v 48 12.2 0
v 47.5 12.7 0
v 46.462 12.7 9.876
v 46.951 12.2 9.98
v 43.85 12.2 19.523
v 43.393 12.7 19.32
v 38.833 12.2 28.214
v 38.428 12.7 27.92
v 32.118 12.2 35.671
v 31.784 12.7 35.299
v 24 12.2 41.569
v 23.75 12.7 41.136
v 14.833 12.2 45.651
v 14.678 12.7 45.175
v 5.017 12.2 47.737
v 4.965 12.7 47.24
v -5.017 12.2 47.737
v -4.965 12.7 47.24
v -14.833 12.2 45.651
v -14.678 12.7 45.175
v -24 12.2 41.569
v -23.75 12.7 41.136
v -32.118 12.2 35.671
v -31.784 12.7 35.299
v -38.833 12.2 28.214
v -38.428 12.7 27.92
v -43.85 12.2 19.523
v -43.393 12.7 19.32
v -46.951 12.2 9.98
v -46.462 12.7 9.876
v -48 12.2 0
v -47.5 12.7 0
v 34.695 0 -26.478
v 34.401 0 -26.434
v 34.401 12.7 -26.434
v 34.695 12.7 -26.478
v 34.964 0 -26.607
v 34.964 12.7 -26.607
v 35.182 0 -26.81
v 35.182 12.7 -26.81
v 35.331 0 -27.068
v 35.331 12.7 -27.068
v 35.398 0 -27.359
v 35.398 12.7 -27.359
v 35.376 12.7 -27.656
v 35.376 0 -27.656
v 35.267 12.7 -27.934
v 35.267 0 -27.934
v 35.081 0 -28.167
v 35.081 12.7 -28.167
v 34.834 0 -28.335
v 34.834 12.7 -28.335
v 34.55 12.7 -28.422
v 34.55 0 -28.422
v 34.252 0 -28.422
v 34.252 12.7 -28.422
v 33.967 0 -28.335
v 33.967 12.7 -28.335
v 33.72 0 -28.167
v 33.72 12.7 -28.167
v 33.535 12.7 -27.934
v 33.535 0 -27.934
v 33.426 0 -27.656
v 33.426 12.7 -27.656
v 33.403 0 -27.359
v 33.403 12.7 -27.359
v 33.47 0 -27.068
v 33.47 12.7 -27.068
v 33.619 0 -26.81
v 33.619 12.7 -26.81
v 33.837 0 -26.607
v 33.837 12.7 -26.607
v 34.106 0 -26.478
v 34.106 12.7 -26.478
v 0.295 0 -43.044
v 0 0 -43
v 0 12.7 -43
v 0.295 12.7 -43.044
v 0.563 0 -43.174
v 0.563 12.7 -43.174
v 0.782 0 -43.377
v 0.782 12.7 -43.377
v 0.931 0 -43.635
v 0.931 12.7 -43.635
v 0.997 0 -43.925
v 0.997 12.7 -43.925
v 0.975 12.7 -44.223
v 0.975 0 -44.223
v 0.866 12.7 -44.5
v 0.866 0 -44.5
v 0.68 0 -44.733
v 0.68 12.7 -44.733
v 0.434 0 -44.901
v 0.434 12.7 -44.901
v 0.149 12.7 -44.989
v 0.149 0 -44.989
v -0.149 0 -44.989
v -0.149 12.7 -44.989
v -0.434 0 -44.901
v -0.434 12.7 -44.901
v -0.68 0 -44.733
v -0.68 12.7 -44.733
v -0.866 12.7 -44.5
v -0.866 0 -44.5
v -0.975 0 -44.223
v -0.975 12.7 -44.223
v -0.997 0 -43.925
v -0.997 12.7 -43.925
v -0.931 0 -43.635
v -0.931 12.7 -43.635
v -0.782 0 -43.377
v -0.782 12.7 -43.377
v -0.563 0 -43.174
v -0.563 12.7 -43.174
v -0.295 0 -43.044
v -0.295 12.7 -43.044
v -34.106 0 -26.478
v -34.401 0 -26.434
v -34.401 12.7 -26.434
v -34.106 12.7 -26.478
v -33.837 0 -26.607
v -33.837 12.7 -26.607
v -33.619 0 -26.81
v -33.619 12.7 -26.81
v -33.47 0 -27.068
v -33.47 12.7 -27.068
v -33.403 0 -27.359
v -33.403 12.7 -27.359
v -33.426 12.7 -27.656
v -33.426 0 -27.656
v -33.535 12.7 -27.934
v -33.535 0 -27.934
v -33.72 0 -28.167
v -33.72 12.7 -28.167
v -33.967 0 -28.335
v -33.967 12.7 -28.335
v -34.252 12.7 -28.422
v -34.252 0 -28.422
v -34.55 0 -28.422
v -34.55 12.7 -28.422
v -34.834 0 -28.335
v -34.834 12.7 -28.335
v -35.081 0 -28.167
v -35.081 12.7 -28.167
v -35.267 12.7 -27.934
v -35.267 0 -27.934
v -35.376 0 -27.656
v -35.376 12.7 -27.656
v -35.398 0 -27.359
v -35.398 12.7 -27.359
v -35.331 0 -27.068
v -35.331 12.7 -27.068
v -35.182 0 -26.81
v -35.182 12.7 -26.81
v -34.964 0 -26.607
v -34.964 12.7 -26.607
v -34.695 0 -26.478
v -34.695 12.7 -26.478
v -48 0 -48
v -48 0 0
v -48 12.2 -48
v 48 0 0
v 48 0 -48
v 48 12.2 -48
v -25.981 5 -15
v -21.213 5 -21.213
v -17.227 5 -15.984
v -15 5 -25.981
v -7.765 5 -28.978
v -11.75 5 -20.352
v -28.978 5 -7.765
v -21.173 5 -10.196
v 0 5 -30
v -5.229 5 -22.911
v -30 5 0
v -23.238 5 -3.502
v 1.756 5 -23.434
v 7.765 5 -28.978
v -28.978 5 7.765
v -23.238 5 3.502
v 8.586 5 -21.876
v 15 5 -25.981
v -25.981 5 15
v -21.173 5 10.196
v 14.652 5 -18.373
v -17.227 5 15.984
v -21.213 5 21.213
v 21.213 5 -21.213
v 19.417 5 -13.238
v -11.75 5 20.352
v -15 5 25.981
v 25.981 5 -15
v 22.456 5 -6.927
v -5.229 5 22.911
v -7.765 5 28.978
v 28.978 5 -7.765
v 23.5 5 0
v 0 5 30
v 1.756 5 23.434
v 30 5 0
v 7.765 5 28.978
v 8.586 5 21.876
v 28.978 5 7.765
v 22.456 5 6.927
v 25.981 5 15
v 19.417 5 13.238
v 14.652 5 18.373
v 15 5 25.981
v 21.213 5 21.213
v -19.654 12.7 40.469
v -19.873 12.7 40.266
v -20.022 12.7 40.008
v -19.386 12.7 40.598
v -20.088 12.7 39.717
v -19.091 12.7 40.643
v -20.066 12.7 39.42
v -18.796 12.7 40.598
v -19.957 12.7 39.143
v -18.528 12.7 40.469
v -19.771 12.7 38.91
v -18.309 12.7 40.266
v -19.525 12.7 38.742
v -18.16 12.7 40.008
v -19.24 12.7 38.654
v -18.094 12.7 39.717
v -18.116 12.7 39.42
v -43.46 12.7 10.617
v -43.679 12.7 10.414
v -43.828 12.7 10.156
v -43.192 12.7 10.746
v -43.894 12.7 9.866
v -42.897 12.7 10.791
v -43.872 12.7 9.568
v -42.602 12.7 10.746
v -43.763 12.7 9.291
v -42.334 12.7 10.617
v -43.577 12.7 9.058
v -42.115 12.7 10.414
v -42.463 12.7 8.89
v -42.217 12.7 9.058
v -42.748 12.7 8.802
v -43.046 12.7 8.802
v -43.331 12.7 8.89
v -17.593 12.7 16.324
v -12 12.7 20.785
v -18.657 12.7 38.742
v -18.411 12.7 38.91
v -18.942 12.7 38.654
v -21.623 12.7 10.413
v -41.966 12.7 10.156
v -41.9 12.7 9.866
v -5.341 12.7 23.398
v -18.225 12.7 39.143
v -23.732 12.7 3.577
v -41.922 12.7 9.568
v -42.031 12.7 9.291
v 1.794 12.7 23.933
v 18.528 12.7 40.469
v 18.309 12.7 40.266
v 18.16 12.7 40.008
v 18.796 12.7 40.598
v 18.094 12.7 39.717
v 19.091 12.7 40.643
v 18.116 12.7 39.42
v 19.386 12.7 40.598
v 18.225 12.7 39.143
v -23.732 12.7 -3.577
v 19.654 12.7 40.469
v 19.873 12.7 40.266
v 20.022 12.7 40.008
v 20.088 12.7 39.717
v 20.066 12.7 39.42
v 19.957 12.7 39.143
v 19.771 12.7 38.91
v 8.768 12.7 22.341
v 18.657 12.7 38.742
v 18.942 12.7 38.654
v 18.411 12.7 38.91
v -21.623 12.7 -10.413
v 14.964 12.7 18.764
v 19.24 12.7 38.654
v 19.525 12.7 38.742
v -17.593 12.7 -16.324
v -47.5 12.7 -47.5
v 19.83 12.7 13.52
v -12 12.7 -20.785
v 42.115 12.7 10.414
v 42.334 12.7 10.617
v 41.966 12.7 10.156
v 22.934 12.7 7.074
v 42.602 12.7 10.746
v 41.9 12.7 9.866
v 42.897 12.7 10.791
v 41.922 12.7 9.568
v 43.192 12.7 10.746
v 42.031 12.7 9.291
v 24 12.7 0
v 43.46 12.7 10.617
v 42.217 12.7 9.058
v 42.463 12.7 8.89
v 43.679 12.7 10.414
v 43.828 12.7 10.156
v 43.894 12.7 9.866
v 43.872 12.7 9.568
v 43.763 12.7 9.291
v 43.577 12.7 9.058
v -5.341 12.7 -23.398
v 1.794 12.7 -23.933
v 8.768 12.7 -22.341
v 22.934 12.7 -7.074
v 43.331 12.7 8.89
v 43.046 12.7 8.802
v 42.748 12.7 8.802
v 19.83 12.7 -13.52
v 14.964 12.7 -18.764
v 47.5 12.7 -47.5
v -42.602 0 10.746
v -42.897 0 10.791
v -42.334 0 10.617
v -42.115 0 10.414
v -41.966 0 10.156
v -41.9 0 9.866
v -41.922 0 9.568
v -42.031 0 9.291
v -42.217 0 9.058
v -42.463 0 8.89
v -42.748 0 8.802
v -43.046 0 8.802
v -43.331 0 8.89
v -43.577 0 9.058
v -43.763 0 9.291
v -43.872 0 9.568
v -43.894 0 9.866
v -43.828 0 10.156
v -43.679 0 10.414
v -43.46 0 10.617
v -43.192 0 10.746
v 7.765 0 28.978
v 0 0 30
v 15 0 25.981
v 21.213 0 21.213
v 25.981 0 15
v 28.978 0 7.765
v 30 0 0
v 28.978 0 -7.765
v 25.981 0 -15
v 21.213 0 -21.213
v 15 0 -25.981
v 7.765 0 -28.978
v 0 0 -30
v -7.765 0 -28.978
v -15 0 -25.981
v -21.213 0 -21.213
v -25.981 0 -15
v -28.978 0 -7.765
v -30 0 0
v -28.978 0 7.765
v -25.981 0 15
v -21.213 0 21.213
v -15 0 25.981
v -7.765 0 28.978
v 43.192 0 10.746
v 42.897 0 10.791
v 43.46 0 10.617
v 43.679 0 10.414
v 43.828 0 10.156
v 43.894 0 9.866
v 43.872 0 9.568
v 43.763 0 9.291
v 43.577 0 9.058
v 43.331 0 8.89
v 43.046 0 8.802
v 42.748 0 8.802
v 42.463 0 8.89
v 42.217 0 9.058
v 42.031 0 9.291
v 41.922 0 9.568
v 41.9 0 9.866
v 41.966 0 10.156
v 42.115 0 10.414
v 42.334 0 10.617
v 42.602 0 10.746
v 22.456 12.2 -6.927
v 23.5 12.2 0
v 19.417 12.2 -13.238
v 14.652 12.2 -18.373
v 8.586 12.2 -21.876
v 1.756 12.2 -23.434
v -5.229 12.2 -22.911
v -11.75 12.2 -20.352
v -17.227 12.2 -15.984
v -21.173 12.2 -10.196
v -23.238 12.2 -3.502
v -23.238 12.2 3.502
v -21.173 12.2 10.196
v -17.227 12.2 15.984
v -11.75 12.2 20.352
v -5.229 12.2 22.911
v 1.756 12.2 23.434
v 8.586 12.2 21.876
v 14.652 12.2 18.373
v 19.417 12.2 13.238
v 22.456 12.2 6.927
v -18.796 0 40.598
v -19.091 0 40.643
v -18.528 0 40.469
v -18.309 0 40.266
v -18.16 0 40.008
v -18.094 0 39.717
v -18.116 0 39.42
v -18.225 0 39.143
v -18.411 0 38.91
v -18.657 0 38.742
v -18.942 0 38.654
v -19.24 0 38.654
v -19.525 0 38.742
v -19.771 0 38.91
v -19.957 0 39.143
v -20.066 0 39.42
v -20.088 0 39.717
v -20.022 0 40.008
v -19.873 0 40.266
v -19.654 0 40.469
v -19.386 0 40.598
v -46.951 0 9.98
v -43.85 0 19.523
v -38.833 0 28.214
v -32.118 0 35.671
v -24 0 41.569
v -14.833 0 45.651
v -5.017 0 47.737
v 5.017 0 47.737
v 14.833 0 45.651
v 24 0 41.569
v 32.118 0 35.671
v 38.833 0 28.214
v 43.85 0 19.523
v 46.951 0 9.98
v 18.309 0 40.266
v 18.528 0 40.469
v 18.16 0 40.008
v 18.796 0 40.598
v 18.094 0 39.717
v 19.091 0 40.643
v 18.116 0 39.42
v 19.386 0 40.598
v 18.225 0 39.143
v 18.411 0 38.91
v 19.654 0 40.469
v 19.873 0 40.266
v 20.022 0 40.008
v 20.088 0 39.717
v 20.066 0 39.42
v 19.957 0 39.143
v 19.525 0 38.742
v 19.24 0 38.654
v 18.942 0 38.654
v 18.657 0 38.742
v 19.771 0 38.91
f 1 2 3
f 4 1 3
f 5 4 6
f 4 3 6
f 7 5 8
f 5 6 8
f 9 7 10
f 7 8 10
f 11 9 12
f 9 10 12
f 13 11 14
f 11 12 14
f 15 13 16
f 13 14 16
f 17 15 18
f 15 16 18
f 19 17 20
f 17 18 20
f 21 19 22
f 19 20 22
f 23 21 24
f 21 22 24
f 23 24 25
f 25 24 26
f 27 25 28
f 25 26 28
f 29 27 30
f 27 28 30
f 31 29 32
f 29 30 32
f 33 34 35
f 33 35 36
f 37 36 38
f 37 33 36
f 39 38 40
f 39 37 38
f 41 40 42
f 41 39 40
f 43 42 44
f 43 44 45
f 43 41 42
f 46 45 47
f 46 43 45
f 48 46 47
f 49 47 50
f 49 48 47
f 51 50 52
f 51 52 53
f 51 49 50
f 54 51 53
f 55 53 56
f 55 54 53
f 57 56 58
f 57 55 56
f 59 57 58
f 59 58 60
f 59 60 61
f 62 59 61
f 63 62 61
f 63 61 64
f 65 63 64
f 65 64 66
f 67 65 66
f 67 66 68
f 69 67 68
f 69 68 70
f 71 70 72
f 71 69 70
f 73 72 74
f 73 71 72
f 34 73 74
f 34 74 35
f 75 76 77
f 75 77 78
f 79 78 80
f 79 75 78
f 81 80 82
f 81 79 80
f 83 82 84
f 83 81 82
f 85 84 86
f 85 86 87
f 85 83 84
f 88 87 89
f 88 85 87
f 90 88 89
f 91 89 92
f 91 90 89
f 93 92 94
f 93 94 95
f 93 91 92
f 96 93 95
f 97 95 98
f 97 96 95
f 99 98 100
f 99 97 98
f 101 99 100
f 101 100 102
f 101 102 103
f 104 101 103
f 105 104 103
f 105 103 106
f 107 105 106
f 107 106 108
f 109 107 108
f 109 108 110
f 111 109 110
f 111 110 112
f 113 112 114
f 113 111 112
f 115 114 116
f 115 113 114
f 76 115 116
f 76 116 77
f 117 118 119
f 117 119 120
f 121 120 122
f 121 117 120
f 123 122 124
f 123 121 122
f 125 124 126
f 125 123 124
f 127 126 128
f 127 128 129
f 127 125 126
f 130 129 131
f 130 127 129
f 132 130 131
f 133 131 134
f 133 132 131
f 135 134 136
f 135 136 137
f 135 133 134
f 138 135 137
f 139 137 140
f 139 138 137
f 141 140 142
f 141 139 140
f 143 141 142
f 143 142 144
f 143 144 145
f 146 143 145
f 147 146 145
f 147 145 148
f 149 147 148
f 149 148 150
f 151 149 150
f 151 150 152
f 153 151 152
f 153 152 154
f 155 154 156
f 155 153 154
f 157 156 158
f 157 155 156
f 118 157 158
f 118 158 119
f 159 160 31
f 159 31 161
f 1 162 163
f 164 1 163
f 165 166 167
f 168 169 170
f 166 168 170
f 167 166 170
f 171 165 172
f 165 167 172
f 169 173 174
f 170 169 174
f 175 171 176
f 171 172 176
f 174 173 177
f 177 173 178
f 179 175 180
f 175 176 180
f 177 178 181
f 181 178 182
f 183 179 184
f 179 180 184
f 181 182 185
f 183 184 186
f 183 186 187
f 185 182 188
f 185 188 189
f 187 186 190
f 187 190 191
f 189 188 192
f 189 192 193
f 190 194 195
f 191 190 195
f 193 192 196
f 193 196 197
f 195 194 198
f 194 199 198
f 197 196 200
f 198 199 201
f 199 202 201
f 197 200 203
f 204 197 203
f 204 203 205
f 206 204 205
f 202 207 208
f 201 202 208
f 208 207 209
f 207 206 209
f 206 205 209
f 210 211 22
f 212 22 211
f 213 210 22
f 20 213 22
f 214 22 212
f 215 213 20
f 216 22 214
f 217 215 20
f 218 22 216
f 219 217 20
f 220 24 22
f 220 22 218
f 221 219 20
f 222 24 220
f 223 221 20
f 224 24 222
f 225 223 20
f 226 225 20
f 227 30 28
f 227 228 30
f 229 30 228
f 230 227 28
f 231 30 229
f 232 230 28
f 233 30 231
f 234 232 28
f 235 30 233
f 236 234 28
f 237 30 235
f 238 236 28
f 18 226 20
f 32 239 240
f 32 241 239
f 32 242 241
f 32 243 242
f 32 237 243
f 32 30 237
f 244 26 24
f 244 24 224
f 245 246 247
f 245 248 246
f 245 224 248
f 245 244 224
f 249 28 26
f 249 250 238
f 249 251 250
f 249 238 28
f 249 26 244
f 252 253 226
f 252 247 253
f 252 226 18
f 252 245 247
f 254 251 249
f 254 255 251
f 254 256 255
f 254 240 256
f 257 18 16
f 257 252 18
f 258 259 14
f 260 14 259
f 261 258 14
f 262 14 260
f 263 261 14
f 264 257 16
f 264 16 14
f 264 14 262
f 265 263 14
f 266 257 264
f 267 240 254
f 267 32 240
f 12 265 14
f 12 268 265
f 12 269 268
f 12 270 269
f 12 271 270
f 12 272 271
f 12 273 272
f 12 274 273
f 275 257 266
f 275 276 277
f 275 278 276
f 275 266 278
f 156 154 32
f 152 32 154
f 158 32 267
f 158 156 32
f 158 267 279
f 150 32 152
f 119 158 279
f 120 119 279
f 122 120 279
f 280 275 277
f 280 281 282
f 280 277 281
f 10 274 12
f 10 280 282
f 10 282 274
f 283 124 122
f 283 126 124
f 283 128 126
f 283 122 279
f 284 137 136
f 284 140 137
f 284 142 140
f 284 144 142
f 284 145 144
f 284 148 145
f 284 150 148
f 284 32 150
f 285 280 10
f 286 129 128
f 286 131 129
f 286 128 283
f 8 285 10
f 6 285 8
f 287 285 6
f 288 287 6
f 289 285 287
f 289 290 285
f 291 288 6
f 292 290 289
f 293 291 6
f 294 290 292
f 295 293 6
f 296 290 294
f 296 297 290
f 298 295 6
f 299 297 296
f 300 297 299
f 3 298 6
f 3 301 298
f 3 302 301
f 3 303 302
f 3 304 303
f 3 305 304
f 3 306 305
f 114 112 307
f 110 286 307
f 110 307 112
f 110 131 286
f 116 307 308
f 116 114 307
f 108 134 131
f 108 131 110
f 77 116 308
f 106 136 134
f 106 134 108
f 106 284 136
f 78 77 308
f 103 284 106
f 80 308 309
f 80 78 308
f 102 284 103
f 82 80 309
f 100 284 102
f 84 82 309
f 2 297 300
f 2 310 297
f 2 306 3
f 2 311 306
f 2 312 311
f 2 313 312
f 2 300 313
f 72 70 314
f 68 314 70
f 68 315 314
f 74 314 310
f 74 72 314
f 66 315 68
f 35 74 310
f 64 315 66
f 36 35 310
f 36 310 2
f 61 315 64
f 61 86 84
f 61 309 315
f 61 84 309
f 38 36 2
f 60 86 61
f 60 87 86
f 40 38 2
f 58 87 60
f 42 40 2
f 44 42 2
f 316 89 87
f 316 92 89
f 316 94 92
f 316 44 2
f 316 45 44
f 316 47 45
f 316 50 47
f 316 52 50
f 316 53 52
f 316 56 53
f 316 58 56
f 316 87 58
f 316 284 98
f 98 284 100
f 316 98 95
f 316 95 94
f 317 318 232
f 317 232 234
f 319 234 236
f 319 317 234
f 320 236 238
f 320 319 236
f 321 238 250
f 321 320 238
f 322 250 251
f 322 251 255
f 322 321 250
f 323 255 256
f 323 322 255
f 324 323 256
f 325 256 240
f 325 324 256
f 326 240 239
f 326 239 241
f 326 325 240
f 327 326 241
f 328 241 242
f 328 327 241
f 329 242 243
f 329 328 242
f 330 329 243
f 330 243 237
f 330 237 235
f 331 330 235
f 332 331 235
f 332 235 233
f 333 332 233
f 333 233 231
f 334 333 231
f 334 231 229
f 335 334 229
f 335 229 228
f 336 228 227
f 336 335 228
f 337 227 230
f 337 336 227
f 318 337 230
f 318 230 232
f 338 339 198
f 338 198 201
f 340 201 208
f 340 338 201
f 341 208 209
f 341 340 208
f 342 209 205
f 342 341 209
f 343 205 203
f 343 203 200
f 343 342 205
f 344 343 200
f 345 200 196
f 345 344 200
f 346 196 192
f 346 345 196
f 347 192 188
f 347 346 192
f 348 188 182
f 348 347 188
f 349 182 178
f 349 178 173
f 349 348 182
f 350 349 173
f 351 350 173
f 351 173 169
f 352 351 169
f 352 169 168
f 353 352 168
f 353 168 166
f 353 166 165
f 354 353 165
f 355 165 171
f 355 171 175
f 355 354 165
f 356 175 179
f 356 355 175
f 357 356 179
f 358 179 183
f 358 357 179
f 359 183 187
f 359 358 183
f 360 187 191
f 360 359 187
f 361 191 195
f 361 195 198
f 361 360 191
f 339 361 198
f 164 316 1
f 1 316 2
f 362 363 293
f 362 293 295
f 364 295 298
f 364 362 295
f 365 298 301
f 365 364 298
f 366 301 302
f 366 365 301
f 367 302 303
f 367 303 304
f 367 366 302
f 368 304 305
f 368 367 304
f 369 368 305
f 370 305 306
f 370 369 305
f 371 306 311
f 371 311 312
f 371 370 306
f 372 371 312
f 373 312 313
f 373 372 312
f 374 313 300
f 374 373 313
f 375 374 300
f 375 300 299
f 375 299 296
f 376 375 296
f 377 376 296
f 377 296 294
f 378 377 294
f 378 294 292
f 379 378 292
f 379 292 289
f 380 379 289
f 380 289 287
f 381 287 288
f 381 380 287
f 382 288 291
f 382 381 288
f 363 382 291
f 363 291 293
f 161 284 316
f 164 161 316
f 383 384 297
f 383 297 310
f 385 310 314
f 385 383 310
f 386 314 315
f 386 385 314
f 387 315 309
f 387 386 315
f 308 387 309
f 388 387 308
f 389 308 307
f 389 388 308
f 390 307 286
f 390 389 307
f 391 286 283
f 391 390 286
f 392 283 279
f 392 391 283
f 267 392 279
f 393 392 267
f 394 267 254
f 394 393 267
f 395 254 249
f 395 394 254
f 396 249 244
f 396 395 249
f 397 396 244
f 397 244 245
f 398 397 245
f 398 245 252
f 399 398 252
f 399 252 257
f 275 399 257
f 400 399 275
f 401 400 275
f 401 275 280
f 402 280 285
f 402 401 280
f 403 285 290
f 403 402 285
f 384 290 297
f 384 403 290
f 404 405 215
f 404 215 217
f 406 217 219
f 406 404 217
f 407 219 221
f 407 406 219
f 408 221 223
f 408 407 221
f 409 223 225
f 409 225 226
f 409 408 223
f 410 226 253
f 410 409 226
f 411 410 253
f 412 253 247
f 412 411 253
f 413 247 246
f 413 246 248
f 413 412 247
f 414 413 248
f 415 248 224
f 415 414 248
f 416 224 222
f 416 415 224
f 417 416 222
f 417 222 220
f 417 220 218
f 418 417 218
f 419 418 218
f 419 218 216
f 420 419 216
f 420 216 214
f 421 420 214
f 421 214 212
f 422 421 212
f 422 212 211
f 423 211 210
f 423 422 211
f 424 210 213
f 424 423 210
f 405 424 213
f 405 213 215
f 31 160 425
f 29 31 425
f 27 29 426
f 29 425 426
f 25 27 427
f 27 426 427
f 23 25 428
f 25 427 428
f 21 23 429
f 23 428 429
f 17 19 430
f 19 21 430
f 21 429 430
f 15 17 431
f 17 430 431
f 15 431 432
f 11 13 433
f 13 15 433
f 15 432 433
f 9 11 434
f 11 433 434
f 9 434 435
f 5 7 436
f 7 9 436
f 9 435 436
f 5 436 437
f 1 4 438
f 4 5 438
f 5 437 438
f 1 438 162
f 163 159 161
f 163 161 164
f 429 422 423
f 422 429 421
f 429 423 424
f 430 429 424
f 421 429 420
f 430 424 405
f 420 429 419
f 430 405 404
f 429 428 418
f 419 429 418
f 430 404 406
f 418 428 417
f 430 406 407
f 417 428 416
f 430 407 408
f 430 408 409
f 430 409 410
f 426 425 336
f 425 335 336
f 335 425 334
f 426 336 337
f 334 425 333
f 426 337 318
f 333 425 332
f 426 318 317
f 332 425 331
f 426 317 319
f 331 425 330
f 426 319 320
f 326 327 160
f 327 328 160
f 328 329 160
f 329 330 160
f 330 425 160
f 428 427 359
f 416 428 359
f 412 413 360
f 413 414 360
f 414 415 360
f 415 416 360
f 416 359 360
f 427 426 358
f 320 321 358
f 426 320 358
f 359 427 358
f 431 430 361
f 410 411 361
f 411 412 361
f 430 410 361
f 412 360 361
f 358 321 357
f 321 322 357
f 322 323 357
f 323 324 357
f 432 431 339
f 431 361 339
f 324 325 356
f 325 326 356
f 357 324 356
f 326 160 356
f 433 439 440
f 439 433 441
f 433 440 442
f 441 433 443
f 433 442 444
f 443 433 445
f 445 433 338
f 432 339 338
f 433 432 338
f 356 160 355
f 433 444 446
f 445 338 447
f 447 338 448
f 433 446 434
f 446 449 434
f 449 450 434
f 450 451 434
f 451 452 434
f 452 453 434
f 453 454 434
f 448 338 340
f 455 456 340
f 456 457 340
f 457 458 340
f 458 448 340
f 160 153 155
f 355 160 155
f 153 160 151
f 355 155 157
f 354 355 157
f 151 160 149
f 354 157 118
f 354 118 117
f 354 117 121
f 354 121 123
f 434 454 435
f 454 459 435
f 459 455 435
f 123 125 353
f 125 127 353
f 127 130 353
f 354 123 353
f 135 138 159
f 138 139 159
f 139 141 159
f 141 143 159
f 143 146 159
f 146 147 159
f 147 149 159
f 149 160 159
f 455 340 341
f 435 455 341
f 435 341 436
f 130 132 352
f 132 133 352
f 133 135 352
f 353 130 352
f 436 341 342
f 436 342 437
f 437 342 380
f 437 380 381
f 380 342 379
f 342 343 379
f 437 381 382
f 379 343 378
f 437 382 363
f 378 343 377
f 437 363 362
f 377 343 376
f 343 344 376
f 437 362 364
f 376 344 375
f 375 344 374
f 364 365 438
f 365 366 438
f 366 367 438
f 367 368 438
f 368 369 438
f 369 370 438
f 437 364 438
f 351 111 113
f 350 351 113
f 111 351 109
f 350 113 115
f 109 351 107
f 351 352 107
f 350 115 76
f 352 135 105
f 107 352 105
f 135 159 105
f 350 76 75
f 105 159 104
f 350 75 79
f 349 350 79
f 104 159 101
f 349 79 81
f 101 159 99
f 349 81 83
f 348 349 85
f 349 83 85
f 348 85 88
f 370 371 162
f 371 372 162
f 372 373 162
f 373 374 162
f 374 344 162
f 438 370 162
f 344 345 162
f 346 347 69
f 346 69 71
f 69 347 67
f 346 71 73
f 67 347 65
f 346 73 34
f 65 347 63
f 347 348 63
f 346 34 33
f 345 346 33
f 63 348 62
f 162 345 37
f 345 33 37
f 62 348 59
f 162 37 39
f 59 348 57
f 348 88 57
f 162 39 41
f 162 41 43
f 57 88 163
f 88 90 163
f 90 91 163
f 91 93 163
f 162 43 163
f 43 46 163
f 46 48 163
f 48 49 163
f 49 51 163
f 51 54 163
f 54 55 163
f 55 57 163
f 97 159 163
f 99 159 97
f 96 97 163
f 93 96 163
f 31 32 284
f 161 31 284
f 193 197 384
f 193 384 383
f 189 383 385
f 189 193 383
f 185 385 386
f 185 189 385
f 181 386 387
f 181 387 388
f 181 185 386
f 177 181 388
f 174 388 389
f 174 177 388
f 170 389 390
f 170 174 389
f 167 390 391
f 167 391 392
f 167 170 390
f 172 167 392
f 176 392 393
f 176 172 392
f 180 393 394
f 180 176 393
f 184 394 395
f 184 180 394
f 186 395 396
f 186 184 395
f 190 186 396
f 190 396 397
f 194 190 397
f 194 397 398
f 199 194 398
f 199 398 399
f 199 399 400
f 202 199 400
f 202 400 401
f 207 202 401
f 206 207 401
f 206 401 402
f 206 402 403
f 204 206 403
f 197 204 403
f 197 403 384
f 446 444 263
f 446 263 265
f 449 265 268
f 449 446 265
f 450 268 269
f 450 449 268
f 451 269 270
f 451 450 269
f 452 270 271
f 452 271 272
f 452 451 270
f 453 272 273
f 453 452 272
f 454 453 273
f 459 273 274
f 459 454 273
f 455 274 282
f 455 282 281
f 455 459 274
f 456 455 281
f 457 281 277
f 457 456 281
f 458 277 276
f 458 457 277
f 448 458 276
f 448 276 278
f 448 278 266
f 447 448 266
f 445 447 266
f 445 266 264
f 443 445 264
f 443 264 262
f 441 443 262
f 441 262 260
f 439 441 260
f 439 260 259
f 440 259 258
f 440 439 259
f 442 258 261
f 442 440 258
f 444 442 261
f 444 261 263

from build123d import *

# Parameters (mm, degrees)
SKETCH2_W           = 96
SKETCH2_H           = 48
BOSS_EXTRUDE1_DEPTH = 12.7
SKETCH1_R           = 48
SKETCH1_R_2         = 23.5
SKETCH1_R_3         = 1
BOSS_EXTRUDE2_DEPTH = 12.7
SKETCH1_2_R         = 23.5
SKETCH1_2_R_2       = 1
CUT_EXTRUDE1_DEPTH  = 12.7
SKETCH3_R           = 30
CUT_EXTRUDE3_DEPTH  = 5
CHAMFER1_SIZE       = 0.5


with BuildPart() as part:
    # Sketch2 → Boss-Extrude1 (new body)
    with BuildSketch(Plane(origin=(0, 0, 0), x_dir=(1, 0, 0), z_dir=(0, 1, 0))):
        with Locations((0, 24)):
            Rectangle(SKETCH2_W, SKETCH2_H)
    extrude(amount=BOSS_EXTRUDE1_DEPTH)

    # Sketch1 → Boss-Extrude2 (add)
    with BuildSketch(Plane(origin=(0, 0, 0), x_dir=(1, 0, 0), z_dir=(0, 1, 0))):
        Circle(SKETCH1_R)
        Circle(SKETCH1_R_2, mode=Mode.SUBTRACT)
        with Locations((0, 44)):
            Circle(SKETCH1_R_3, mode=Mode.SUBTRACT)
        with Locations((34.400585229, 27.433551282)):
            Circle(SKETCH1_R_3, mode=Mode.SUBTRACT)
        with Locations((42.896828136, -9.790921094)):
            Circle(SKETCH1_R_3, mode=Mode.SUBTRACT)
        with Locations((19.090884521, -39.642630188)):
            Circle(SKETCH1_R_3, mode=Mode.SUBTRACT)
        with Locations((-19.090884521, -39.642630188)):
            Circle(SKETCH1_R_3, mode=Mode.SUBTRACT)
        with Locations((-42.896828136, -9.790921094)):
            Circle(SKETCH1_R_3, mode=Mode.SUBTRACT)
        with Locations((-34.400585229, 27.433551282)):
            Circle(SKETCH1_R_3, mode=Mode.SUBTRACT)
    extrude(amount=BOSS_EXTRUDE2_DEPTH)

    # Sketch1<2> → Cut-Extrude1 (cut)
    with BuildSketch(Plane(origin=(0, 0, 0), x_dir=(1, 0, 0), z_dir=(0, 1, 0))):
        Circle(SKETCH1_2_R)
        with Locations((0, 44)):
            Circle(SKETCH1_2_R_2)
        with Locations((34.400585229, 27.433551282)):
            Circle(SKETCH1_2_R_2)
        with Locations((-34.400585229, 27.433551282)):
            Circle(SKETCH1_2_R_2)
    extrude(amount=CUT_EXTRUDE1_DEPTH, mode=Mode.SUBTRACT)

    # Sketch3 → Cut-Extrude3 (cut)
    with BuildSketch(Plane(origin=(0, 0, 0), x_dir=(1, 0, 0), z_dir=(0, 1, 0))):
        Circle(SKETCH3_R)
    extrude(amount=CUT_EXTRUDE3_DEPTH, mode=Mode.SUBTRACT)

    # Chamfer1
    chamfer1_edges = [part.edges().sort_by_distance(p)[0] for p in [
        (-23.5, 12.7, 0),
        (48, 12.7, -24),
        (0, 12.7, 48),
        (-48, 12.7, -24),
        (0, 12.7, -48),
    ]]
    chamfer(chamfer1_edges, length=CHAMFER1_SIZE)


solid = part.part
